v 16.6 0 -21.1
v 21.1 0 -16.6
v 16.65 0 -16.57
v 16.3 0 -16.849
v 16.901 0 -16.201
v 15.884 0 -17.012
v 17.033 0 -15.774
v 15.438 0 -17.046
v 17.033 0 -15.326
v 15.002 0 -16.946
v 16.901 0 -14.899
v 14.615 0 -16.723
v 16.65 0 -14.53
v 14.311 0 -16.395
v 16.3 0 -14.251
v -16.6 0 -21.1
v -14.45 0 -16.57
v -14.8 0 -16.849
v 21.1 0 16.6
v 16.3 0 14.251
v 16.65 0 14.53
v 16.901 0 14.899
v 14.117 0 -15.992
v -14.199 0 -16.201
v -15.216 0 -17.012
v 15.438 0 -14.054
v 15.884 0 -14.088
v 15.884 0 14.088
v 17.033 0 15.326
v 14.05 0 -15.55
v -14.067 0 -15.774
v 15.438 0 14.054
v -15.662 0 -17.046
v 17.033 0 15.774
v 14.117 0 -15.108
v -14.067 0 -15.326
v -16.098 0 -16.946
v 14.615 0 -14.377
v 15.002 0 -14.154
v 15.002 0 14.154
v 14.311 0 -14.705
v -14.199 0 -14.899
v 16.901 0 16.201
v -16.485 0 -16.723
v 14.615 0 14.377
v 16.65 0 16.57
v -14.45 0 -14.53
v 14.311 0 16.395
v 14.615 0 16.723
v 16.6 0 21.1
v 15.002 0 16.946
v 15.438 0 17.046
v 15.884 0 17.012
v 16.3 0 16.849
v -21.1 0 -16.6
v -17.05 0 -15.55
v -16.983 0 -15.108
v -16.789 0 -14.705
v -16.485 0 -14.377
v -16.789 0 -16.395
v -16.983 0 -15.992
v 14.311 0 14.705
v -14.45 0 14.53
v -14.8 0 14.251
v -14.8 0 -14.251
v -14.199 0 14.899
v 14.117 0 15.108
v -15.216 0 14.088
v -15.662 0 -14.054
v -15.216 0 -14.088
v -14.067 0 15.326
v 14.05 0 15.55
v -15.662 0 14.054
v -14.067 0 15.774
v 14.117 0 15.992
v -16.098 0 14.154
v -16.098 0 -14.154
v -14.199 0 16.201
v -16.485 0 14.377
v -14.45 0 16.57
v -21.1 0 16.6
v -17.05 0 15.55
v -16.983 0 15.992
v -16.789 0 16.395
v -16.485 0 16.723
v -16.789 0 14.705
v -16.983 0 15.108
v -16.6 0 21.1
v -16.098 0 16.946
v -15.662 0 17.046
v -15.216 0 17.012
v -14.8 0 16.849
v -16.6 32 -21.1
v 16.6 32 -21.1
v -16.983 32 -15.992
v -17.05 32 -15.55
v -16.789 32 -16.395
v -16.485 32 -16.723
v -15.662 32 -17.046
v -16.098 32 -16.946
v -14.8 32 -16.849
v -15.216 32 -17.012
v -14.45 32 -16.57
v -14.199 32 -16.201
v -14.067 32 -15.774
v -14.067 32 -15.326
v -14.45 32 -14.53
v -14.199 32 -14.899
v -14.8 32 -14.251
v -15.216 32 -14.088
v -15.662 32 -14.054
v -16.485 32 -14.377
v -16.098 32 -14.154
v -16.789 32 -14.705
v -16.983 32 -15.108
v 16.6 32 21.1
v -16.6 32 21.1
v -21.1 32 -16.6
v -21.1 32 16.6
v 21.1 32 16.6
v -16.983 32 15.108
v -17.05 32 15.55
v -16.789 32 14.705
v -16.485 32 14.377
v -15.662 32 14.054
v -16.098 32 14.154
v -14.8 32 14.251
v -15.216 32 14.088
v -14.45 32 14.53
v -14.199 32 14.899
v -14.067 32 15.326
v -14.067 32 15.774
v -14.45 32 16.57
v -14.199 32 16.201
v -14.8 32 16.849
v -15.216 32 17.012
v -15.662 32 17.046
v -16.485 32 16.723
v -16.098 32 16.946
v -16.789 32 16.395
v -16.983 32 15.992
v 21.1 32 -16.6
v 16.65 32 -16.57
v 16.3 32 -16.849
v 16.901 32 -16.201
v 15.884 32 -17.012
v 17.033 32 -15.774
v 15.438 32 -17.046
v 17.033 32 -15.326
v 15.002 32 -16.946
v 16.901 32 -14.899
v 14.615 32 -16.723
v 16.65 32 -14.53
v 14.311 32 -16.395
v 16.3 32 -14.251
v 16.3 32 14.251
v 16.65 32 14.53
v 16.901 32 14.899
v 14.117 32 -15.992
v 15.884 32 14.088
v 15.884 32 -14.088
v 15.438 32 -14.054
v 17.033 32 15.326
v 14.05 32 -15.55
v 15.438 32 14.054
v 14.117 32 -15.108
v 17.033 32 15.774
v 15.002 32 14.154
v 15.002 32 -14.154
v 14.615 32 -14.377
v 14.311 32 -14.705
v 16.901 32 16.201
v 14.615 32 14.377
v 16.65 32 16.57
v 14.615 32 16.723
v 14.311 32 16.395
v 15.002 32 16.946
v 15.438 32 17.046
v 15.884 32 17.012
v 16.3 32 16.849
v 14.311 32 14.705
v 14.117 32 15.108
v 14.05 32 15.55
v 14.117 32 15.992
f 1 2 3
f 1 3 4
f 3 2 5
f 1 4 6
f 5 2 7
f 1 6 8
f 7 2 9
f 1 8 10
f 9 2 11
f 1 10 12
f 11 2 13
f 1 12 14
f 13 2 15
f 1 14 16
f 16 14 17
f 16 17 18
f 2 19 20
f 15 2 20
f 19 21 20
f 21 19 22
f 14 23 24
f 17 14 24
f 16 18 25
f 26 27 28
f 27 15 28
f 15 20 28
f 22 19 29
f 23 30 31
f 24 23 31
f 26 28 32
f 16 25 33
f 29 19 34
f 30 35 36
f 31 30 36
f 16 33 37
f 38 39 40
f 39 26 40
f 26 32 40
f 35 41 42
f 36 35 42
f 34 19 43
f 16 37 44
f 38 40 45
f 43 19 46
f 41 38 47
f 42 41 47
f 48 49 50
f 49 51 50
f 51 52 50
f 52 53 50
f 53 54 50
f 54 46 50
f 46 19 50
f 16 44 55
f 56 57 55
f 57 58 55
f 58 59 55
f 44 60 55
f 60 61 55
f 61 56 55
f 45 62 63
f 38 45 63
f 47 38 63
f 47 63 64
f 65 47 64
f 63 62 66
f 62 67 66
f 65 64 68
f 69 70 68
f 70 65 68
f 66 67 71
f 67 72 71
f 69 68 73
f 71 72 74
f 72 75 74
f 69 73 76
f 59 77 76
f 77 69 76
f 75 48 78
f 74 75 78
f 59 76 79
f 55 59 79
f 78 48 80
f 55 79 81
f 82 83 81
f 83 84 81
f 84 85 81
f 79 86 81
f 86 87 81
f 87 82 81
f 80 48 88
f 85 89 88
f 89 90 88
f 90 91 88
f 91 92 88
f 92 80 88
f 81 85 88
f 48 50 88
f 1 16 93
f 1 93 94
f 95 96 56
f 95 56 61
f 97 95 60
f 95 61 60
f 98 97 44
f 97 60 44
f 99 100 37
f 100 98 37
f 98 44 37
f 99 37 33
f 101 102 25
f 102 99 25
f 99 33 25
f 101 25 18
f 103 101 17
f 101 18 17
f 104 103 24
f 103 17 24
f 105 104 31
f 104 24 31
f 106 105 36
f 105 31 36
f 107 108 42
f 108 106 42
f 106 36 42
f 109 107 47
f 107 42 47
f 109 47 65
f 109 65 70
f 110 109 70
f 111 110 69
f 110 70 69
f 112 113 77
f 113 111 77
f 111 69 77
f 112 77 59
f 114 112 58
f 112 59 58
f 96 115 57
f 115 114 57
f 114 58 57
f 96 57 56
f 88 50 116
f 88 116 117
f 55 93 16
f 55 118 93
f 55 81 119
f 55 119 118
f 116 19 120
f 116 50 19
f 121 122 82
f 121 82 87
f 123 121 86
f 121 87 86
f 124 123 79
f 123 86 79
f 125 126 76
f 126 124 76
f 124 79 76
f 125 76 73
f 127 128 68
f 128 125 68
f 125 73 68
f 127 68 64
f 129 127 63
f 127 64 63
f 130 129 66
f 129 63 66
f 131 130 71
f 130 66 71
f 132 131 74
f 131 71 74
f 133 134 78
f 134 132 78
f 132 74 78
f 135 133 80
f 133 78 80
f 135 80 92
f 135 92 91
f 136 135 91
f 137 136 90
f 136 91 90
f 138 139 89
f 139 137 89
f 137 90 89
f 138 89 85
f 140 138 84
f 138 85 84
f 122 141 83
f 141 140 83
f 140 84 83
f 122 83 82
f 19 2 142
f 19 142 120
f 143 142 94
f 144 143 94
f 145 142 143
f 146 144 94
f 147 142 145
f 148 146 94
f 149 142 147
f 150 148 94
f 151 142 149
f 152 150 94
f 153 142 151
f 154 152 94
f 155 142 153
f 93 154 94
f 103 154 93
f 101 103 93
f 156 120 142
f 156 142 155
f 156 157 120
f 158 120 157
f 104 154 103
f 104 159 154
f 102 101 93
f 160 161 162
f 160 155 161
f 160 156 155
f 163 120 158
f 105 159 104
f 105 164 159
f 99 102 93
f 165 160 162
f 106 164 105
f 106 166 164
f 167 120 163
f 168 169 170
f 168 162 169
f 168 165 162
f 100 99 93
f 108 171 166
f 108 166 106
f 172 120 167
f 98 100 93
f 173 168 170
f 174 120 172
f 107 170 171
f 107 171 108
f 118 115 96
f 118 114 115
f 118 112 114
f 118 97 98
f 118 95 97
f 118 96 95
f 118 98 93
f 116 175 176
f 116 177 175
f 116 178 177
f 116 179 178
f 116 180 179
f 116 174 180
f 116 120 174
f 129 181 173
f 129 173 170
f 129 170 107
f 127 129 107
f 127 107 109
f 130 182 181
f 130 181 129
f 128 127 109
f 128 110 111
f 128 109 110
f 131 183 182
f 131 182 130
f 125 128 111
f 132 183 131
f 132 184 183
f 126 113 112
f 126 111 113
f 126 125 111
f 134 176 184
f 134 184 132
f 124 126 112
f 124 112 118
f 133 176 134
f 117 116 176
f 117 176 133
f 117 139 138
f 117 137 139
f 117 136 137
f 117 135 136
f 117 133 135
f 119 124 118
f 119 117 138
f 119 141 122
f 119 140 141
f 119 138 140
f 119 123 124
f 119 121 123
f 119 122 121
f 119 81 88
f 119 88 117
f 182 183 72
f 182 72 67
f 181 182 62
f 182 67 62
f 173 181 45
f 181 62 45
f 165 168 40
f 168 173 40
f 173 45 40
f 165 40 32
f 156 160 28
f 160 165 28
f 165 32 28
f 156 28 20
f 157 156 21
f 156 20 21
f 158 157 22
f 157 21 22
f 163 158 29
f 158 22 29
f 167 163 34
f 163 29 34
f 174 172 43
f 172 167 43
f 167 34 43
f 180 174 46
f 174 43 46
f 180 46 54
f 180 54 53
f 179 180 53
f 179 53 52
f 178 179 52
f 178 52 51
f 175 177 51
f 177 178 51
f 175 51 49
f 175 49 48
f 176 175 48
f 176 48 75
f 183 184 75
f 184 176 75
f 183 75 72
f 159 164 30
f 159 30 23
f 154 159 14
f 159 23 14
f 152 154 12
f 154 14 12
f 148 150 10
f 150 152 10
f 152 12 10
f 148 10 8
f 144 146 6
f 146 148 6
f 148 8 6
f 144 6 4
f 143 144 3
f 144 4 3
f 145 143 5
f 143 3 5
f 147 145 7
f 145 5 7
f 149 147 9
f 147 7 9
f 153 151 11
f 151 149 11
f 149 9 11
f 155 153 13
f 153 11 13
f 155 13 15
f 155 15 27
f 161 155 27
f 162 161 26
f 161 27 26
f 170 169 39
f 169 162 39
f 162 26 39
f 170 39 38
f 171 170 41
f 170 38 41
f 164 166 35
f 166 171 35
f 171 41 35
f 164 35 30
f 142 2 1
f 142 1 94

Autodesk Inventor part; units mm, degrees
ref_plane "YZ Plane" through (0, 0, 0) normal (1, 0, 0) x (0, 1, 0)
ref_plane "XZ Plane" through (0, 0, 0) normal (0, 1, 0) x (-1, 0, 0)
ref_plane "XY Plane" through (0, 0, 0) normal (0, 0, 1) x (1, 0, 0)
sketch "Эскиз1" plane through (0, 0, 0) normal (0, 1, 0) x (-1, 0, 0)
  line L0 (21.1, -21.1) -> (-21.1, -21.1)
  line L1 (-21.1, -21.1) -> (-21.1, 21.1)
  line L2 (-21.1, 21.1) -> (21.1, 21.1)
  line L3 (21.1, 21.1) -> (21.1, -21.1)
  line L4 (21.1, -21.1) -> (-21.1, 21.1) construction
  line L5 (-21.1, -21.1) -> (21.1, 21.1) construction
  line L6 (-15.55, 15.55) -> (15.55, 15.55) construction
  line L7 (15.55, 15.55) -> (15.55, -15.55) construction
  line L8 (15.55, -15.55) -> (-15.55, -15.55) construction
  line L9 (-15.55, -15.55) -> (-15.55, 15.55) construction
  line L10 (-15.55, 15.55) -> (15.55, -15.55) construction
  line L11 (15.55, 15.55) -> (-15.55, -15.55) construction
  circle A0 centre (-15.55, -15.55) radius 1.5
  circle A1 centre (15.55, -15.55) radius 1.5
  circle A2 centre (15.55, 15.55) radius 1.5
  circle A3 centre (-15.55, 15.55) radius 1.5
  point P0 (0, 0)
  dimension "d0" = 42.2
  dimension "d1" = 42.2
  dimension "d2" = 31.1
  dimension "d3" = 31.1
  dimension "d4" = 3
  dimension "d5" = 3
  dimension "d6" = 3
  dimension "d7" = 3
extrude "Выдавливание1" add sketch "Эскиз1" along normal blind 32
chamfer "Фаска1" distance 4.5 angle 45 4 edges at (21.1, 16, -21.1) (21.1, 16, 21.1) (-21.1, 16, 21.1) (-21.1, 16, -21.1)
thread "Резьба1" size "M3x0.5" class "6H" standard "ANSI Metric M Profile" full length
thread "Резьба2" size "M3x0.5" class "6H" standard "ANSI Metric M Profile" full length
thread "Резьба3" size "M3x0.5" class "6H" standard "ANSI Metric M Profile" full length
thread "Резьба4" size "M3x0.5" class "6H" standard "ANSI Metric M Profile" full length
properties part number "Top"
